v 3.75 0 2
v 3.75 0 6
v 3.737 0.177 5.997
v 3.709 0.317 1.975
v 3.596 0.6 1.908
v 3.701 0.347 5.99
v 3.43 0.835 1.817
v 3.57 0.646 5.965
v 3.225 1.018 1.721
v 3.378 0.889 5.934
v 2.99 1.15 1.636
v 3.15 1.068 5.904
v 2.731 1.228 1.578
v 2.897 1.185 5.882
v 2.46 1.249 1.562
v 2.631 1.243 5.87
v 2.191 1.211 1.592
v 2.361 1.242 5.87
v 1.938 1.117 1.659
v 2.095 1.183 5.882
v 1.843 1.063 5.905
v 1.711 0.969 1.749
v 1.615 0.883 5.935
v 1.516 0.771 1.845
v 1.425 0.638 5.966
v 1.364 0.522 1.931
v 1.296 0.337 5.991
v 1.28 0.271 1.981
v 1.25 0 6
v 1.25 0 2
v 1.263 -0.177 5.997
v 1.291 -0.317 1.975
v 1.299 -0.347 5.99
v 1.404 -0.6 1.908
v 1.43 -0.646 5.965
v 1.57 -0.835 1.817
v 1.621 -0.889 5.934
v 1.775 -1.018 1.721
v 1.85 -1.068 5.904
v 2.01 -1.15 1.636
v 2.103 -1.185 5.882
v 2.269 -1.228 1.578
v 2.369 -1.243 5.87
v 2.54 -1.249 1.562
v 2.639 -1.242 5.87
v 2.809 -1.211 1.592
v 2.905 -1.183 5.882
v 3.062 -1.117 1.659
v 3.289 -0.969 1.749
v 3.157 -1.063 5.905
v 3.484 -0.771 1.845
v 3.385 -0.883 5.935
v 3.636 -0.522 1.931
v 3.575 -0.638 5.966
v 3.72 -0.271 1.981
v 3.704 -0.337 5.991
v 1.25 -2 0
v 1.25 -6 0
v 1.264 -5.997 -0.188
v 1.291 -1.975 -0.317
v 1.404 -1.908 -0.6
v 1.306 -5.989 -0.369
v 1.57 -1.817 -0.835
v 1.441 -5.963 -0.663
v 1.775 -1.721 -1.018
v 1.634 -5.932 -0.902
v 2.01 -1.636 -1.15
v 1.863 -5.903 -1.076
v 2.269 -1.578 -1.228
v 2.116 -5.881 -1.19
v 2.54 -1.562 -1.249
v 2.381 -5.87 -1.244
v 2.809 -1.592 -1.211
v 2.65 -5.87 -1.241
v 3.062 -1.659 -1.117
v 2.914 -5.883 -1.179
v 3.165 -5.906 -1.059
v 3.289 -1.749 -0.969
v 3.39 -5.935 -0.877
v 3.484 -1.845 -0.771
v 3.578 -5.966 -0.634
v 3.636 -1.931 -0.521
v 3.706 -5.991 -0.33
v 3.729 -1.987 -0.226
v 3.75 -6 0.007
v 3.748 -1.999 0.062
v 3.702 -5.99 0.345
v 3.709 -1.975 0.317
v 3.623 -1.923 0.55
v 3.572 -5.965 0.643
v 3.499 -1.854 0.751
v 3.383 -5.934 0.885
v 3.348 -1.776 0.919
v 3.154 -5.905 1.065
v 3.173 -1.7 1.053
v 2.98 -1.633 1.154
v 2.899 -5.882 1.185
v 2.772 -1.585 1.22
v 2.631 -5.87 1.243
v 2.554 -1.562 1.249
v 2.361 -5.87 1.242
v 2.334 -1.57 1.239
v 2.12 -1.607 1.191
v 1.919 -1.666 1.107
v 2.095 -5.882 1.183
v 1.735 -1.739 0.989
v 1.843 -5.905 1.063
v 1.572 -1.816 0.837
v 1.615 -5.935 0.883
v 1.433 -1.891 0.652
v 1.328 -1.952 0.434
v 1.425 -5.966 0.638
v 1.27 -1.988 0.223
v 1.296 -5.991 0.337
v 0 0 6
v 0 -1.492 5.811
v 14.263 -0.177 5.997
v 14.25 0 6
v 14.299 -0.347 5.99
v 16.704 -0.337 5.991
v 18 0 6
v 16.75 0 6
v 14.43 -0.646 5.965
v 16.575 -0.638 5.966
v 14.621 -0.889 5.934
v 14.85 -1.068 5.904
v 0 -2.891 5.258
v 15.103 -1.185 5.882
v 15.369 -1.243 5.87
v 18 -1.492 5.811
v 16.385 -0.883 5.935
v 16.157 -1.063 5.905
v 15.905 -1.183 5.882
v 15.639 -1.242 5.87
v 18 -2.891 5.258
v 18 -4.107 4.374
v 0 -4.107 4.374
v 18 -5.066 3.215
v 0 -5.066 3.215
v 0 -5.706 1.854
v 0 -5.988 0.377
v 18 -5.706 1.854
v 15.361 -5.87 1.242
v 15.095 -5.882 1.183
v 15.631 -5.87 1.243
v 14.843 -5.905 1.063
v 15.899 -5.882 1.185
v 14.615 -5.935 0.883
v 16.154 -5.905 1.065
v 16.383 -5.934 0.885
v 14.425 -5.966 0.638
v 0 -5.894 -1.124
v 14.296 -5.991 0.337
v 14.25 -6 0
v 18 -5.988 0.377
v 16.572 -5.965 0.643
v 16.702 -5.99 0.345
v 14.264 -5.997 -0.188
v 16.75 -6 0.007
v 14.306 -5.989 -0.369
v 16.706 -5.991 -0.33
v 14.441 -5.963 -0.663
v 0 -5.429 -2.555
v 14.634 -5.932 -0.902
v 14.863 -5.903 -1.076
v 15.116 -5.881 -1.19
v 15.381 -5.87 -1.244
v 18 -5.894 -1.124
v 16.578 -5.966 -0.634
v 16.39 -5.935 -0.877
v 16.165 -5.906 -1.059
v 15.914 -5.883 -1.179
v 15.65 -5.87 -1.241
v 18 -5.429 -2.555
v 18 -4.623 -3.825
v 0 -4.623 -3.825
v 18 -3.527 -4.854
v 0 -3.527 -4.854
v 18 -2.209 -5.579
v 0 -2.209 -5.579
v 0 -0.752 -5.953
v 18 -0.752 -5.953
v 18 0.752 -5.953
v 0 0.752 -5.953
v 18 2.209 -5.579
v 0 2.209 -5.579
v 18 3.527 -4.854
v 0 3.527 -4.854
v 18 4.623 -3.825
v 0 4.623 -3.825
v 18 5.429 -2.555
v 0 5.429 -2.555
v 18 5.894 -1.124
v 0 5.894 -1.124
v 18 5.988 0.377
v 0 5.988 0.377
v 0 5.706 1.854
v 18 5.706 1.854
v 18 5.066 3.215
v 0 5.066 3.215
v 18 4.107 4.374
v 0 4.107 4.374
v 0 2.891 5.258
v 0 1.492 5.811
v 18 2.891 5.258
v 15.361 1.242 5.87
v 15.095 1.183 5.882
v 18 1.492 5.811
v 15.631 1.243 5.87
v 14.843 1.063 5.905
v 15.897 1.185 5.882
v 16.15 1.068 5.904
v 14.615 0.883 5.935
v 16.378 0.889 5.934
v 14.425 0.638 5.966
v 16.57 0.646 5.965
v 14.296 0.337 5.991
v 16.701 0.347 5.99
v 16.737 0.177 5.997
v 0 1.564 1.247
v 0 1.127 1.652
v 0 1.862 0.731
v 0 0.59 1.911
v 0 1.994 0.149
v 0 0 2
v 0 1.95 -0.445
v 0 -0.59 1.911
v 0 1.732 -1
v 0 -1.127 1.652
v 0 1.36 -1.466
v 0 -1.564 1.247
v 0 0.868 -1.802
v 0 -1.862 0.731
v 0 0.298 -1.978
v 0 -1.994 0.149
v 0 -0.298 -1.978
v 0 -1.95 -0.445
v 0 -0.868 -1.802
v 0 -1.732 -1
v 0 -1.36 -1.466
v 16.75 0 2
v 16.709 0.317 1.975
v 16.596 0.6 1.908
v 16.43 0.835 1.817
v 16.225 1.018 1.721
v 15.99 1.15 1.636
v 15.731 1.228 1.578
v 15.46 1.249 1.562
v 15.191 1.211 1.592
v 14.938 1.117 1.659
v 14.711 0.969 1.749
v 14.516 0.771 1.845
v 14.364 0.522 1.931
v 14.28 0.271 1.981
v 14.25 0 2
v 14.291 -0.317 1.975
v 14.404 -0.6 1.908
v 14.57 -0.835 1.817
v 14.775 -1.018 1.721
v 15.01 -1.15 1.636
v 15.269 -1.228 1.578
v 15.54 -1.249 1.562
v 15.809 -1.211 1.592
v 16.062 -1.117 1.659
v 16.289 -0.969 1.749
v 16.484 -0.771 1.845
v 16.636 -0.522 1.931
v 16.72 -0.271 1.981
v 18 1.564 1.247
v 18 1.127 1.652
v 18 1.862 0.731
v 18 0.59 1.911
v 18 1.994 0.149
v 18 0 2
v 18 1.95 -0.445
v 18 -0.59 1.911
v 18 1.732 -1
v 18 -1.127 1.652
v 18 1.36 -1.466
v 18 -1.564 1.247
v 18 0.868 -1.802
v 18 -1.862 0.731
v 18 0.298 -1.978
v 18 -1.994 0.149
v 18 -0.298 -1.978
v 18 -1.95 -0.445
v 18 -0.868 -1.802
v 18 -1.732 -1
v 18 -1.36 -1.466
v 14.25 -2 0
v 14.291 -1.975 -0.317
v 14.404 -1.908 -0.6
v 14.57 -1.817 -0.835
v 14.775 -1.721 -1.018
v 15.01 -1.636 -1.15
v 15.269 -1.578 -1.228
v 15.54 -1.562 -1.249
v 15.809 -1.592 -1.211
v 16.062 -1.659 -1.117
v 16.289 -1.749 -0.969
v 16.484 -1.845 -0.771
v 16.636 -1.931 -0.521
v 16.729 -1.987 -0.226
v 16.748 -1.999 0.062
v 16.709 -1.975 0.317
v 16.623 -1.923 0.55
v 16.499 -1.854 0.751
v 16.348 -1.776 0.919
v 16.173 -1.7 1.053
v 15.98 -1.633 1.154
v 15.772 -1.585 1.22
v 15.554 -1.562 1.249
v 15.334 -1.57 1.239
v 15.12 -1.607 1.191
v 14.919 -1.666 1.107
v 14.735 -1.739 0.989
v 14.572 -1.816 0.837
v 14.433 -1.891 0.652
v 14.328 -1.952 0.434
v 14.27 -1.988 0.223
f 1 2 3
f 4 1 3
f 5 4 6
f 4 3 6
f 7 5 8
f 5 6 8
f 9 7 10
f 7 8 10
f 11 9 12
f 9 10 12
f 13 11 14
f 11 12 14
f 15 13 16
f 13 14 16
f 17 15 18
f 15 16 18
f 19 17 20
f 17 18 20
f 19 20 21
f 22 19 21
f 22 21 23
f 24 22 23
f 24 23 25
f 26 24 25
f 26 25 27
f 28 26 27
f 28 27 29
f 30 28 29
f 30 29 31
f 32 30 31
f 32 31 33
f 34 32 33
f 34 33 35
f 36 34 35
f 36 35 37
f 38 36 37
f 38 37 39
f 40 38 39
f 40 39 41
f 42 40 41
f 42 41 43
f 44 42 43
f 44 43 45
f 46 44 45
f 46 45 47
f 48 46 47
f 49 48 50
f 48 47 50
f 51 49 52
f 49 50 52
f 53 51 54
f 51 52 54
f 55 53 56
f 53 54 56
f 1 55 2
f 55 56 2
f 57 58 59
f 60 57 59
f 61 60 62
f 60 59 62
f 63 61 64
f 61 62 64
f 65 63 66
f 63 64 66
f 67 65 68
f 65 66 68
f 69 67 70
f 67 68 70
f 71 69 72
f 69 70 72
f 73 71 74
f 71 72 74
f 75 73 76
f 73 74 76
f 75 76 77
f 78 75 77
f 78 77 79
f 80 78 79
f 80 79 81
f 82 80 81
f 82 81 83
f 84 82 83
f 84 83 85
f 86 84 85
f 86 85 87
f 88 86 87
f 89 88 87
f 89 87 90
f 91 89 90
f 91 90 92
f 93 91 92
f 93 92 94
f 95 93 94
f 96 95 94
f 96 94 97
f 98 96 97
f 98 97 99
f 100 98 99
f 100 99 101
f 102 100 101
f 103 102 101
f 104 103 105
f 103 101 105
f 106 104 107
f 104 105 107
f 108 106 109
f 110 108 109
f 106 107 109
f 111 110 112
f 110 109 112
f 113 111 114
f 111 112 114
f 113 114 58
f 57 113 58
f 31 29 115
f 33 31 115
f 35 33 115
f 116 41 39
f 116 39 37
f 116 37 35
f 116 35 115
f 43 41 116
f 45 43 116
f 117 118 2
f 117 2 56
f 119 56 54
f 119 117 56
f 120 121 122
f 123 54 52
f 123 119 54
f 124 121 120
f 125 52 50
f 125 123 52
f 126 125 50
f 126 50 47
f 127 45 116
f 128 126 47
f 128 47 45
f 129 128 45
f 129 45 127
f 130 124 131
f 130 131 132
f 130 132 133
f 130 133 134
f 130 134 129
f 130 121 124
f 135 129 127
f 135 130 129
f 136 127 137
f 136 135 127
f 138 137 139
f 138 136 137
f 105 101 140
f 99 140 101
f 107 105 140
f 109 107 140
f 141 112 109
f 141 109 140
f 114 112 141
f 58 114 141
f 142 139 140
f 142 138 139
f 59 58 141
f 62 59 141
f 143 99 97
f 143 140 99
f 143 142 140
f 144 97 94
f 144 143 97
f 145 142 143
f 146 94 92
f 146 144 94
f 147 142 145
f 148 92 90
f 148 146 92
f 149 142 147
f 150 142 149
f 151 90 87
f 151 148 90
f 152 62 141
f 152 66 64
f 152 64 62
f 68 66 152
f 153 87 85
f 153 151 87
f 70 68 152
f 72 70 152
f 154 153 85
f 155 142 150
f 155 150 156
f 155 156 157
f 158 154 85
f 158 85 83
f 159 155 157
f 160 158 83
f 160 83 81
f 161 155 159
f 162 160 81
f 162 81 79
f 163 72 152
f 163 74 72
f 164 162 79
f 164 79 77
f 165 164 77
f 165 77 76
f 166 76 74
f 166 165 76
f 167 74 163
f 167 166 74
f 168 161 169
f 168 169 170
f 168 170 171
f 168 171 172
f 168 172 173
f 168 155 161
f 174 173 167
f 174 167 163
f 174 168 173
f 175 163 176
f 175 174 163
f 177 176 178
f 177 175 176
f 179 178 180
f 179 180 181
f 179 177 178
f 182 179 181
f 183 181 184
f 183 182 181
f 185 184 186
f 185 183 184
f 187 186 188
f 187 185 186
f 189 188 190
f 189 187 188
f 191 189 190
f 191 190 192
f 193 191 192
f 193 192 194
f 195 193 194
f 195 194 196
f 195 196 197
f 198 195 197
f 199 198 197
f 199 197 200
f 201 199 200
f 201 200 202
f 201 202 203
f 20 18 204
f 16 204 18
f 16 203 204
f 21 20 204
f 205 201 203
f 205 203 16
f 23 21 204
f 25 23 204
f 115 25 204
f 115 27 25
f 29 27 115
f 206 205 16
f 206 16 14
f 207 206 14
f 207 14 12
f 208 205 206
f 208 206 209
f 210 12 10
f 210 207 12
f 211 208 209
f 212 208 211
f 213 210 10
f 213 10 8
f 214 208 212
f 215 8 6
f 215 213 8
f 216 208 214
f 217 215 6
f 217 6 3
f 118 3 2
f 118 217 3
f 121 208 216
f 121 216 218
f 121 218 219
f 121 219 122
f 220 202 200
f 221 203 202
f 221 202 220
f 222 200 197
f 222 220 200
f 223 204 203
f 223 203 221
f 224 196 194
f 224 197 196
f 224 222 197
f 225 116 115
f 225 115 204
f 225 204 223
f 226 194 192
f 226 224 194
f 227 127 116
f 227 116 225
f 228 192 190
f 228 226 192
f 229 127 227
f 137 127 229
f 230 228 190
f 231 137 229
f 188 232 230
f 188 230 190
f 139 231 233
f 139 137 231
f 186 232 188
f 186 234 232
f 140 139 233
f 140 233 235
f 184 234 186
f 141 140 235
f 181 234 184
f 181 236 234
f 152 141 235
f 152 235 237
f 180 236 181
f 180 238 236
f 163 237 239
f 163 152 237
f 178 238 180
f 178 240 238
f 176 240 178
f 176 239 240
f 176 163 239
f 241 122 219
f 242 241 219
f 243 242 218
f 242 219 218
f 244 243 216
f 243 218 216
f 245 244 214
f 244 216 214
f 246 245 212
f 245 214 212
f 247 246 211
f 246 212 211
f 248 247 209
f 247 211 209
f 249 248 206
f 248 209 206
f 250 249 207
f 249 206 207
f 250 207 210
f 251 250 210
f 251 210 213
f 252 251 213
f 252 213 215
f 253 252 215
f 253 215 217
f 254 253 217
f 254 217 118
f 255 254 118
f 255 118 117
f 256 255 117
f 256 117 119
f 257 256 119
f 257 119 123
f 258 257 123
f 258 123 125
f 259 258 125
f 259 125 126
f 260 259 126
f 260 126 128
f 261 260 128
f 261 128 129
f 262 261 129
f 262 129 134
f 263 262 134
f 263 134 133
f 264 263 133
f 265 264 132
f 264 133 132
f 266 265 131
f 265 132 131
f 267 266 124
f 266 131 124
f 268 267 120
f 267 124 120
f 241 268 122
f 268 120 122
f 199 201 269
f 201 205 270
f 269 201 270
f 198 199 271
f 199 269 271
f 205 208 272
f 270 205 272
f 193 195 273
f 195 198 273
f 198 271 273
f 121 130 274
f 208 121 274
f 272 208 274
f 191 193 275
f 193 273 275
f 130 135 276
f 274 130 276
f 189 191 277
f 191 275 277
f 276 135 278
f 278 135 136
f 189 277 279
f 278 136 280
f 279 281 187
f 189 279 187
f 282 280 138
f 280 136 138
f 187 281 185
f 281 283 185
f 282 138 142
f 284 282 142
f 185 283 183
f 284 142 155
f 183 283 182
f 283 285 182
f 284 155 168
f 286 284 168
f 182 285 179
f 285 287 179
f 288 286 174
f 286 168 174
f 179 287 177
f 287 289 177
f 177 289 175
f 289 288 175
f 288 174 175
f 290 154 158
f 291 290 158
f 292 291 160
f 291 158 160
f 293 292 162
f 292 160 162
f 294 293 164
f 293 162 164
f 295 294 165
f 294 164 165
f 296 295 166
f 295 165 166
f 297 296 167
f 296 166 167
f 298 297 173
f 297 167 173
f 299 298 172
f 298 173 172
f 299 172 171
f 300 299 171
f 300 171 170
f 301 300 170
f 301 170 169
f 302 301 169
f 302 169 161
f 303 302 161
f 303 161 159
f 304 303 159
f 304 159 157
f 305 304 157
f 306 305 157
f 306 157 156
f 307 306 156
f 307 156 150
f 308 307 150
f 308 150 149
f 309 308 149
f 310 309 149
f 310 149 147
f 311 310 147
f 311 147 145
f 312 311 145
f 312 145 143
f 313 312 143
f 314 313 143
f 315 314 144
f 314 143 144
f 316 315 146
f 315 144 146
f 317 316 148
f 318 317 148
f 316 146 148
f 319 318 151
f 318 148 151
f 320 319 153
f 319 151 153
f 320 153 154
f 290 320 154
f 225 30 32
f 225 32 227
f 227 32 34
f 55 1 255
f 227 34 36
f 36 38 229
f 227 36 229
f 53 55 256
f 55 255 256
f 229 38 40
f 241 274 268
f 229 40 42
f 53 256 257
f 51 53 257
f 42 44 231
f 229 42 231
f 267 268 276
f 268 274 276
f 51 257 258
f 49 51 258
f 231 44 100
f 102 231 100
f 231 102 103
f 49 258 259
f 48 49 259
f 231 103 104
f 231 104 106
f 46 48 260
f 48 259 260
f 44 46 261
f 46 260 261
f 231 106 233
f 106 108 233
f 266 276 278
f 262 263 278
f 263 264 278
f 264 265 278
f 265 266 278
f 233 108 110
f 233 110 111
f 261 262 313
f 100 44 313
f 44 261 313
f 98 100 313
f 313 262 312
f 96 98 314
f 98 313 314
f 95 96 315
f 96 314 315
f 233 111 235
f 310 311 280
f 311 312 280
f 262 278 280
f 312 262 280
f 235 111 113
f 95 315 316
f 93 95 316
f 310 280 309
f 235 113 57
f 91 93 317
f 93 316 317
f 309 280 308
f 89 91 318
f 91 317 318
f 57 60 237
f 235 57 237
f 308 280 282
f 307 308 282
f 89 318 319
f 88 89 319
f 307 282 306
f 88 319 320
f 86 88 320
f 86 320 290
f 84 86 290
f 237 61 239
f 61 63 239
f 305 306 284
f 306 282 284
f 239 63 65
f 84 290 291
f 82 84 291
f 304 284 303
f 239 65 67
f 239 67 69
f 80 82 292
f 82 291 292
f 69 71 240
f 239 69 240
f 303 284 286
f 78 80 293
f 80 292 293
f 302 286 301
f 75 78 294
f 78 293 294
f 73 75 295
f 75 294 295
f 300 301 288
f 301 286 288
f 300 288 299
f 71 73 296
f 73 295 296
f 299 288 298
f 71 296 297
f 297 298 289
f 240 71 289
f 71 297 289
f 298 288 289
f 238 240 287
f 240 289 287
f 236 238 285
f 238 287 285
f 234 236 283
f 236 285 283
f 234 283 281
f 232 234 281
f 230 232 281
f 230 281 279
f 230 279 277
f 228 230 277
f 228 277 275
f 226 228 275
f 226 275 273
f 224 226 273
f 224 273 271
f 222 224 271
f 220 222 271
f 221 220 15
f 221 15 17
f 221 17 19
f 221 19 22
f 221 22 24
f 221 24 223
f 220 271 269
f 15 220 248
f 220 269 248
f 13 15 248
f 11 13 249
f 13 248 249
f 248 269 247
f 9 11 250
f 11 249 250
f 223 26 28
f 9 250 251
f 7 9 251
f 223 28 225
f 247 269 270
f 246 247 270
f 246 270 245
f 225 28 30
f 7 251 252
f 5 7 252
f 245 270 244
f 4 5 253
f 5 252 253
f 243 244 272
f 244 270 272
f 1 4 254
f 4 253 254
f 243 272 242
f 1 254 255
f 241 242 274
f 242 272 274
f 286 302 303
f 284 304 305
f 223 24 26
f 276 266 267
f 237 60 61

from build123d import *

# Parameters (mm, degrees)
SKETCH2_W              = 18
SKETCH2_H              = 4
M3_TAPPED_HOLE1_REACH  = 24.45
M3_TAPPED_HOLE1_BORE_R = 1.25
M3_TAPPED_HOLE2_REACH  = 24.45
M3_TAPPED_HOLE2_BORE_R = 1.25


with BuildPart() as part:
    # Sketch2 → Revolve1 (revolve)
    with BuildSketch(Plane.XY, mode=Mode.PRIVATE) as revolve1_sk:
        with Locations((9, 4)):
            Rectangle(SKETCH2_W, SKETCH2_H)
    revolve(revolve1_sk.sketch.rotate(Axis((0, 0, 0), (1, 0, 0)), 90), axis=Axis((0, 0, 0), (1, 0, 0)))

    # M3 Tapped Hole1 bore → M3 Tapped Hole1 (cut, up to next)
    with BuildSketch(Plane(origin=(0, -6, 0), x_dir=(-1, 0, 0), z_dir=(0, -1, 0)), mode=Mode.PRIVATE) as m3_tapped_hole1_sk1:
        with Locations((-15.5, 0)):
            Circle(M3_TAPPED_HOLE1_BORE_R)
    m3_tapped_hole1_tool1 = extrude(m3_tapped_hole1_sk1.sketch, amount=-M3_TAPPED_HOLE1_REACH, mode=Mode.PRIVATE) & part.part
    # M3 Tapped Hole1 bore → M3 Tapped Hole1 (cut, up to next)
    with BuildSketch(Plane(origin=(0, -6, 0), x_dir=(-1, 0, 0), z_dir=(0, -1, 0)), mode=Mode.PRIVATE) as m3_tapped_hole1_sk2:
        with Locations((-2.5, 0)):
            Circle(M3_TAPPED_HOLE1_BORE_R)
    m3_tapped_hole1_tool2 = extrude(m3_tapped_hole1_sk2.sketch, amount=-M3_TAPPED_HOLE1_REACH, mode=Mode.PRIVATE) & part.part
    add(m3_tapped_hole1_tool1.solids().sort_by_distance((15.5, -6, 0))[0], mode=Mode.SUBTRACT)
    add(m3_tapped_hole1_tool2.solids().sort_by_distance((2.5, -6, 0))[0], mode=Mode.SUBTRACT)

    # M3 Tapped Hole2 bore → M3 Tapped Hole2 (cut, up to next)
    with BuildSketch(Plane.XY.offset(6), mode=Mode.PRIVATE) as m3_tapped_hole2_sk1:
        with Locations((2.5, 0)):
            Circle(M3_TAPPED_HOLE2_BORE_R)
    m3_tapped_hole2_tool1 = extrude(m3_tapped_hole2_sk1.sketch, amount=-M3_TAPPED_HOLE2_REACH, mode=Mode.PRIVATE) & part.part
    # M3 Tapped Hole2 bore → M3 Tapped Hole2 (cut, up to next)
    with BuildSketch(Plane.XY.offset(6), mode=Mode.PRIVATE) as m3_tapped_hole2_sk2:
        with Locations((15.5, 0)):
            Circle(M3_TAPPED_HOLE2_BORE_R)
    m3_tapped_hole2_tool2 = extrude(m3_tapped_hole2_sk2.sketch, amount=-M3_TAPPED_HOLE2_REACH, mode=Mode.PRIVATE) & part.part
    add(m3_tapped_hole2_tool1.solids().sort_by_distance((2.5, 0, 6))[0], mode=Mode.SUBTRACT)
    add(m3_tapped_hole2_tool2.solids().sort_by_distance((15.5, 0, 6))[0], mode=Mode.SUBTRACT)


solid = part.part
